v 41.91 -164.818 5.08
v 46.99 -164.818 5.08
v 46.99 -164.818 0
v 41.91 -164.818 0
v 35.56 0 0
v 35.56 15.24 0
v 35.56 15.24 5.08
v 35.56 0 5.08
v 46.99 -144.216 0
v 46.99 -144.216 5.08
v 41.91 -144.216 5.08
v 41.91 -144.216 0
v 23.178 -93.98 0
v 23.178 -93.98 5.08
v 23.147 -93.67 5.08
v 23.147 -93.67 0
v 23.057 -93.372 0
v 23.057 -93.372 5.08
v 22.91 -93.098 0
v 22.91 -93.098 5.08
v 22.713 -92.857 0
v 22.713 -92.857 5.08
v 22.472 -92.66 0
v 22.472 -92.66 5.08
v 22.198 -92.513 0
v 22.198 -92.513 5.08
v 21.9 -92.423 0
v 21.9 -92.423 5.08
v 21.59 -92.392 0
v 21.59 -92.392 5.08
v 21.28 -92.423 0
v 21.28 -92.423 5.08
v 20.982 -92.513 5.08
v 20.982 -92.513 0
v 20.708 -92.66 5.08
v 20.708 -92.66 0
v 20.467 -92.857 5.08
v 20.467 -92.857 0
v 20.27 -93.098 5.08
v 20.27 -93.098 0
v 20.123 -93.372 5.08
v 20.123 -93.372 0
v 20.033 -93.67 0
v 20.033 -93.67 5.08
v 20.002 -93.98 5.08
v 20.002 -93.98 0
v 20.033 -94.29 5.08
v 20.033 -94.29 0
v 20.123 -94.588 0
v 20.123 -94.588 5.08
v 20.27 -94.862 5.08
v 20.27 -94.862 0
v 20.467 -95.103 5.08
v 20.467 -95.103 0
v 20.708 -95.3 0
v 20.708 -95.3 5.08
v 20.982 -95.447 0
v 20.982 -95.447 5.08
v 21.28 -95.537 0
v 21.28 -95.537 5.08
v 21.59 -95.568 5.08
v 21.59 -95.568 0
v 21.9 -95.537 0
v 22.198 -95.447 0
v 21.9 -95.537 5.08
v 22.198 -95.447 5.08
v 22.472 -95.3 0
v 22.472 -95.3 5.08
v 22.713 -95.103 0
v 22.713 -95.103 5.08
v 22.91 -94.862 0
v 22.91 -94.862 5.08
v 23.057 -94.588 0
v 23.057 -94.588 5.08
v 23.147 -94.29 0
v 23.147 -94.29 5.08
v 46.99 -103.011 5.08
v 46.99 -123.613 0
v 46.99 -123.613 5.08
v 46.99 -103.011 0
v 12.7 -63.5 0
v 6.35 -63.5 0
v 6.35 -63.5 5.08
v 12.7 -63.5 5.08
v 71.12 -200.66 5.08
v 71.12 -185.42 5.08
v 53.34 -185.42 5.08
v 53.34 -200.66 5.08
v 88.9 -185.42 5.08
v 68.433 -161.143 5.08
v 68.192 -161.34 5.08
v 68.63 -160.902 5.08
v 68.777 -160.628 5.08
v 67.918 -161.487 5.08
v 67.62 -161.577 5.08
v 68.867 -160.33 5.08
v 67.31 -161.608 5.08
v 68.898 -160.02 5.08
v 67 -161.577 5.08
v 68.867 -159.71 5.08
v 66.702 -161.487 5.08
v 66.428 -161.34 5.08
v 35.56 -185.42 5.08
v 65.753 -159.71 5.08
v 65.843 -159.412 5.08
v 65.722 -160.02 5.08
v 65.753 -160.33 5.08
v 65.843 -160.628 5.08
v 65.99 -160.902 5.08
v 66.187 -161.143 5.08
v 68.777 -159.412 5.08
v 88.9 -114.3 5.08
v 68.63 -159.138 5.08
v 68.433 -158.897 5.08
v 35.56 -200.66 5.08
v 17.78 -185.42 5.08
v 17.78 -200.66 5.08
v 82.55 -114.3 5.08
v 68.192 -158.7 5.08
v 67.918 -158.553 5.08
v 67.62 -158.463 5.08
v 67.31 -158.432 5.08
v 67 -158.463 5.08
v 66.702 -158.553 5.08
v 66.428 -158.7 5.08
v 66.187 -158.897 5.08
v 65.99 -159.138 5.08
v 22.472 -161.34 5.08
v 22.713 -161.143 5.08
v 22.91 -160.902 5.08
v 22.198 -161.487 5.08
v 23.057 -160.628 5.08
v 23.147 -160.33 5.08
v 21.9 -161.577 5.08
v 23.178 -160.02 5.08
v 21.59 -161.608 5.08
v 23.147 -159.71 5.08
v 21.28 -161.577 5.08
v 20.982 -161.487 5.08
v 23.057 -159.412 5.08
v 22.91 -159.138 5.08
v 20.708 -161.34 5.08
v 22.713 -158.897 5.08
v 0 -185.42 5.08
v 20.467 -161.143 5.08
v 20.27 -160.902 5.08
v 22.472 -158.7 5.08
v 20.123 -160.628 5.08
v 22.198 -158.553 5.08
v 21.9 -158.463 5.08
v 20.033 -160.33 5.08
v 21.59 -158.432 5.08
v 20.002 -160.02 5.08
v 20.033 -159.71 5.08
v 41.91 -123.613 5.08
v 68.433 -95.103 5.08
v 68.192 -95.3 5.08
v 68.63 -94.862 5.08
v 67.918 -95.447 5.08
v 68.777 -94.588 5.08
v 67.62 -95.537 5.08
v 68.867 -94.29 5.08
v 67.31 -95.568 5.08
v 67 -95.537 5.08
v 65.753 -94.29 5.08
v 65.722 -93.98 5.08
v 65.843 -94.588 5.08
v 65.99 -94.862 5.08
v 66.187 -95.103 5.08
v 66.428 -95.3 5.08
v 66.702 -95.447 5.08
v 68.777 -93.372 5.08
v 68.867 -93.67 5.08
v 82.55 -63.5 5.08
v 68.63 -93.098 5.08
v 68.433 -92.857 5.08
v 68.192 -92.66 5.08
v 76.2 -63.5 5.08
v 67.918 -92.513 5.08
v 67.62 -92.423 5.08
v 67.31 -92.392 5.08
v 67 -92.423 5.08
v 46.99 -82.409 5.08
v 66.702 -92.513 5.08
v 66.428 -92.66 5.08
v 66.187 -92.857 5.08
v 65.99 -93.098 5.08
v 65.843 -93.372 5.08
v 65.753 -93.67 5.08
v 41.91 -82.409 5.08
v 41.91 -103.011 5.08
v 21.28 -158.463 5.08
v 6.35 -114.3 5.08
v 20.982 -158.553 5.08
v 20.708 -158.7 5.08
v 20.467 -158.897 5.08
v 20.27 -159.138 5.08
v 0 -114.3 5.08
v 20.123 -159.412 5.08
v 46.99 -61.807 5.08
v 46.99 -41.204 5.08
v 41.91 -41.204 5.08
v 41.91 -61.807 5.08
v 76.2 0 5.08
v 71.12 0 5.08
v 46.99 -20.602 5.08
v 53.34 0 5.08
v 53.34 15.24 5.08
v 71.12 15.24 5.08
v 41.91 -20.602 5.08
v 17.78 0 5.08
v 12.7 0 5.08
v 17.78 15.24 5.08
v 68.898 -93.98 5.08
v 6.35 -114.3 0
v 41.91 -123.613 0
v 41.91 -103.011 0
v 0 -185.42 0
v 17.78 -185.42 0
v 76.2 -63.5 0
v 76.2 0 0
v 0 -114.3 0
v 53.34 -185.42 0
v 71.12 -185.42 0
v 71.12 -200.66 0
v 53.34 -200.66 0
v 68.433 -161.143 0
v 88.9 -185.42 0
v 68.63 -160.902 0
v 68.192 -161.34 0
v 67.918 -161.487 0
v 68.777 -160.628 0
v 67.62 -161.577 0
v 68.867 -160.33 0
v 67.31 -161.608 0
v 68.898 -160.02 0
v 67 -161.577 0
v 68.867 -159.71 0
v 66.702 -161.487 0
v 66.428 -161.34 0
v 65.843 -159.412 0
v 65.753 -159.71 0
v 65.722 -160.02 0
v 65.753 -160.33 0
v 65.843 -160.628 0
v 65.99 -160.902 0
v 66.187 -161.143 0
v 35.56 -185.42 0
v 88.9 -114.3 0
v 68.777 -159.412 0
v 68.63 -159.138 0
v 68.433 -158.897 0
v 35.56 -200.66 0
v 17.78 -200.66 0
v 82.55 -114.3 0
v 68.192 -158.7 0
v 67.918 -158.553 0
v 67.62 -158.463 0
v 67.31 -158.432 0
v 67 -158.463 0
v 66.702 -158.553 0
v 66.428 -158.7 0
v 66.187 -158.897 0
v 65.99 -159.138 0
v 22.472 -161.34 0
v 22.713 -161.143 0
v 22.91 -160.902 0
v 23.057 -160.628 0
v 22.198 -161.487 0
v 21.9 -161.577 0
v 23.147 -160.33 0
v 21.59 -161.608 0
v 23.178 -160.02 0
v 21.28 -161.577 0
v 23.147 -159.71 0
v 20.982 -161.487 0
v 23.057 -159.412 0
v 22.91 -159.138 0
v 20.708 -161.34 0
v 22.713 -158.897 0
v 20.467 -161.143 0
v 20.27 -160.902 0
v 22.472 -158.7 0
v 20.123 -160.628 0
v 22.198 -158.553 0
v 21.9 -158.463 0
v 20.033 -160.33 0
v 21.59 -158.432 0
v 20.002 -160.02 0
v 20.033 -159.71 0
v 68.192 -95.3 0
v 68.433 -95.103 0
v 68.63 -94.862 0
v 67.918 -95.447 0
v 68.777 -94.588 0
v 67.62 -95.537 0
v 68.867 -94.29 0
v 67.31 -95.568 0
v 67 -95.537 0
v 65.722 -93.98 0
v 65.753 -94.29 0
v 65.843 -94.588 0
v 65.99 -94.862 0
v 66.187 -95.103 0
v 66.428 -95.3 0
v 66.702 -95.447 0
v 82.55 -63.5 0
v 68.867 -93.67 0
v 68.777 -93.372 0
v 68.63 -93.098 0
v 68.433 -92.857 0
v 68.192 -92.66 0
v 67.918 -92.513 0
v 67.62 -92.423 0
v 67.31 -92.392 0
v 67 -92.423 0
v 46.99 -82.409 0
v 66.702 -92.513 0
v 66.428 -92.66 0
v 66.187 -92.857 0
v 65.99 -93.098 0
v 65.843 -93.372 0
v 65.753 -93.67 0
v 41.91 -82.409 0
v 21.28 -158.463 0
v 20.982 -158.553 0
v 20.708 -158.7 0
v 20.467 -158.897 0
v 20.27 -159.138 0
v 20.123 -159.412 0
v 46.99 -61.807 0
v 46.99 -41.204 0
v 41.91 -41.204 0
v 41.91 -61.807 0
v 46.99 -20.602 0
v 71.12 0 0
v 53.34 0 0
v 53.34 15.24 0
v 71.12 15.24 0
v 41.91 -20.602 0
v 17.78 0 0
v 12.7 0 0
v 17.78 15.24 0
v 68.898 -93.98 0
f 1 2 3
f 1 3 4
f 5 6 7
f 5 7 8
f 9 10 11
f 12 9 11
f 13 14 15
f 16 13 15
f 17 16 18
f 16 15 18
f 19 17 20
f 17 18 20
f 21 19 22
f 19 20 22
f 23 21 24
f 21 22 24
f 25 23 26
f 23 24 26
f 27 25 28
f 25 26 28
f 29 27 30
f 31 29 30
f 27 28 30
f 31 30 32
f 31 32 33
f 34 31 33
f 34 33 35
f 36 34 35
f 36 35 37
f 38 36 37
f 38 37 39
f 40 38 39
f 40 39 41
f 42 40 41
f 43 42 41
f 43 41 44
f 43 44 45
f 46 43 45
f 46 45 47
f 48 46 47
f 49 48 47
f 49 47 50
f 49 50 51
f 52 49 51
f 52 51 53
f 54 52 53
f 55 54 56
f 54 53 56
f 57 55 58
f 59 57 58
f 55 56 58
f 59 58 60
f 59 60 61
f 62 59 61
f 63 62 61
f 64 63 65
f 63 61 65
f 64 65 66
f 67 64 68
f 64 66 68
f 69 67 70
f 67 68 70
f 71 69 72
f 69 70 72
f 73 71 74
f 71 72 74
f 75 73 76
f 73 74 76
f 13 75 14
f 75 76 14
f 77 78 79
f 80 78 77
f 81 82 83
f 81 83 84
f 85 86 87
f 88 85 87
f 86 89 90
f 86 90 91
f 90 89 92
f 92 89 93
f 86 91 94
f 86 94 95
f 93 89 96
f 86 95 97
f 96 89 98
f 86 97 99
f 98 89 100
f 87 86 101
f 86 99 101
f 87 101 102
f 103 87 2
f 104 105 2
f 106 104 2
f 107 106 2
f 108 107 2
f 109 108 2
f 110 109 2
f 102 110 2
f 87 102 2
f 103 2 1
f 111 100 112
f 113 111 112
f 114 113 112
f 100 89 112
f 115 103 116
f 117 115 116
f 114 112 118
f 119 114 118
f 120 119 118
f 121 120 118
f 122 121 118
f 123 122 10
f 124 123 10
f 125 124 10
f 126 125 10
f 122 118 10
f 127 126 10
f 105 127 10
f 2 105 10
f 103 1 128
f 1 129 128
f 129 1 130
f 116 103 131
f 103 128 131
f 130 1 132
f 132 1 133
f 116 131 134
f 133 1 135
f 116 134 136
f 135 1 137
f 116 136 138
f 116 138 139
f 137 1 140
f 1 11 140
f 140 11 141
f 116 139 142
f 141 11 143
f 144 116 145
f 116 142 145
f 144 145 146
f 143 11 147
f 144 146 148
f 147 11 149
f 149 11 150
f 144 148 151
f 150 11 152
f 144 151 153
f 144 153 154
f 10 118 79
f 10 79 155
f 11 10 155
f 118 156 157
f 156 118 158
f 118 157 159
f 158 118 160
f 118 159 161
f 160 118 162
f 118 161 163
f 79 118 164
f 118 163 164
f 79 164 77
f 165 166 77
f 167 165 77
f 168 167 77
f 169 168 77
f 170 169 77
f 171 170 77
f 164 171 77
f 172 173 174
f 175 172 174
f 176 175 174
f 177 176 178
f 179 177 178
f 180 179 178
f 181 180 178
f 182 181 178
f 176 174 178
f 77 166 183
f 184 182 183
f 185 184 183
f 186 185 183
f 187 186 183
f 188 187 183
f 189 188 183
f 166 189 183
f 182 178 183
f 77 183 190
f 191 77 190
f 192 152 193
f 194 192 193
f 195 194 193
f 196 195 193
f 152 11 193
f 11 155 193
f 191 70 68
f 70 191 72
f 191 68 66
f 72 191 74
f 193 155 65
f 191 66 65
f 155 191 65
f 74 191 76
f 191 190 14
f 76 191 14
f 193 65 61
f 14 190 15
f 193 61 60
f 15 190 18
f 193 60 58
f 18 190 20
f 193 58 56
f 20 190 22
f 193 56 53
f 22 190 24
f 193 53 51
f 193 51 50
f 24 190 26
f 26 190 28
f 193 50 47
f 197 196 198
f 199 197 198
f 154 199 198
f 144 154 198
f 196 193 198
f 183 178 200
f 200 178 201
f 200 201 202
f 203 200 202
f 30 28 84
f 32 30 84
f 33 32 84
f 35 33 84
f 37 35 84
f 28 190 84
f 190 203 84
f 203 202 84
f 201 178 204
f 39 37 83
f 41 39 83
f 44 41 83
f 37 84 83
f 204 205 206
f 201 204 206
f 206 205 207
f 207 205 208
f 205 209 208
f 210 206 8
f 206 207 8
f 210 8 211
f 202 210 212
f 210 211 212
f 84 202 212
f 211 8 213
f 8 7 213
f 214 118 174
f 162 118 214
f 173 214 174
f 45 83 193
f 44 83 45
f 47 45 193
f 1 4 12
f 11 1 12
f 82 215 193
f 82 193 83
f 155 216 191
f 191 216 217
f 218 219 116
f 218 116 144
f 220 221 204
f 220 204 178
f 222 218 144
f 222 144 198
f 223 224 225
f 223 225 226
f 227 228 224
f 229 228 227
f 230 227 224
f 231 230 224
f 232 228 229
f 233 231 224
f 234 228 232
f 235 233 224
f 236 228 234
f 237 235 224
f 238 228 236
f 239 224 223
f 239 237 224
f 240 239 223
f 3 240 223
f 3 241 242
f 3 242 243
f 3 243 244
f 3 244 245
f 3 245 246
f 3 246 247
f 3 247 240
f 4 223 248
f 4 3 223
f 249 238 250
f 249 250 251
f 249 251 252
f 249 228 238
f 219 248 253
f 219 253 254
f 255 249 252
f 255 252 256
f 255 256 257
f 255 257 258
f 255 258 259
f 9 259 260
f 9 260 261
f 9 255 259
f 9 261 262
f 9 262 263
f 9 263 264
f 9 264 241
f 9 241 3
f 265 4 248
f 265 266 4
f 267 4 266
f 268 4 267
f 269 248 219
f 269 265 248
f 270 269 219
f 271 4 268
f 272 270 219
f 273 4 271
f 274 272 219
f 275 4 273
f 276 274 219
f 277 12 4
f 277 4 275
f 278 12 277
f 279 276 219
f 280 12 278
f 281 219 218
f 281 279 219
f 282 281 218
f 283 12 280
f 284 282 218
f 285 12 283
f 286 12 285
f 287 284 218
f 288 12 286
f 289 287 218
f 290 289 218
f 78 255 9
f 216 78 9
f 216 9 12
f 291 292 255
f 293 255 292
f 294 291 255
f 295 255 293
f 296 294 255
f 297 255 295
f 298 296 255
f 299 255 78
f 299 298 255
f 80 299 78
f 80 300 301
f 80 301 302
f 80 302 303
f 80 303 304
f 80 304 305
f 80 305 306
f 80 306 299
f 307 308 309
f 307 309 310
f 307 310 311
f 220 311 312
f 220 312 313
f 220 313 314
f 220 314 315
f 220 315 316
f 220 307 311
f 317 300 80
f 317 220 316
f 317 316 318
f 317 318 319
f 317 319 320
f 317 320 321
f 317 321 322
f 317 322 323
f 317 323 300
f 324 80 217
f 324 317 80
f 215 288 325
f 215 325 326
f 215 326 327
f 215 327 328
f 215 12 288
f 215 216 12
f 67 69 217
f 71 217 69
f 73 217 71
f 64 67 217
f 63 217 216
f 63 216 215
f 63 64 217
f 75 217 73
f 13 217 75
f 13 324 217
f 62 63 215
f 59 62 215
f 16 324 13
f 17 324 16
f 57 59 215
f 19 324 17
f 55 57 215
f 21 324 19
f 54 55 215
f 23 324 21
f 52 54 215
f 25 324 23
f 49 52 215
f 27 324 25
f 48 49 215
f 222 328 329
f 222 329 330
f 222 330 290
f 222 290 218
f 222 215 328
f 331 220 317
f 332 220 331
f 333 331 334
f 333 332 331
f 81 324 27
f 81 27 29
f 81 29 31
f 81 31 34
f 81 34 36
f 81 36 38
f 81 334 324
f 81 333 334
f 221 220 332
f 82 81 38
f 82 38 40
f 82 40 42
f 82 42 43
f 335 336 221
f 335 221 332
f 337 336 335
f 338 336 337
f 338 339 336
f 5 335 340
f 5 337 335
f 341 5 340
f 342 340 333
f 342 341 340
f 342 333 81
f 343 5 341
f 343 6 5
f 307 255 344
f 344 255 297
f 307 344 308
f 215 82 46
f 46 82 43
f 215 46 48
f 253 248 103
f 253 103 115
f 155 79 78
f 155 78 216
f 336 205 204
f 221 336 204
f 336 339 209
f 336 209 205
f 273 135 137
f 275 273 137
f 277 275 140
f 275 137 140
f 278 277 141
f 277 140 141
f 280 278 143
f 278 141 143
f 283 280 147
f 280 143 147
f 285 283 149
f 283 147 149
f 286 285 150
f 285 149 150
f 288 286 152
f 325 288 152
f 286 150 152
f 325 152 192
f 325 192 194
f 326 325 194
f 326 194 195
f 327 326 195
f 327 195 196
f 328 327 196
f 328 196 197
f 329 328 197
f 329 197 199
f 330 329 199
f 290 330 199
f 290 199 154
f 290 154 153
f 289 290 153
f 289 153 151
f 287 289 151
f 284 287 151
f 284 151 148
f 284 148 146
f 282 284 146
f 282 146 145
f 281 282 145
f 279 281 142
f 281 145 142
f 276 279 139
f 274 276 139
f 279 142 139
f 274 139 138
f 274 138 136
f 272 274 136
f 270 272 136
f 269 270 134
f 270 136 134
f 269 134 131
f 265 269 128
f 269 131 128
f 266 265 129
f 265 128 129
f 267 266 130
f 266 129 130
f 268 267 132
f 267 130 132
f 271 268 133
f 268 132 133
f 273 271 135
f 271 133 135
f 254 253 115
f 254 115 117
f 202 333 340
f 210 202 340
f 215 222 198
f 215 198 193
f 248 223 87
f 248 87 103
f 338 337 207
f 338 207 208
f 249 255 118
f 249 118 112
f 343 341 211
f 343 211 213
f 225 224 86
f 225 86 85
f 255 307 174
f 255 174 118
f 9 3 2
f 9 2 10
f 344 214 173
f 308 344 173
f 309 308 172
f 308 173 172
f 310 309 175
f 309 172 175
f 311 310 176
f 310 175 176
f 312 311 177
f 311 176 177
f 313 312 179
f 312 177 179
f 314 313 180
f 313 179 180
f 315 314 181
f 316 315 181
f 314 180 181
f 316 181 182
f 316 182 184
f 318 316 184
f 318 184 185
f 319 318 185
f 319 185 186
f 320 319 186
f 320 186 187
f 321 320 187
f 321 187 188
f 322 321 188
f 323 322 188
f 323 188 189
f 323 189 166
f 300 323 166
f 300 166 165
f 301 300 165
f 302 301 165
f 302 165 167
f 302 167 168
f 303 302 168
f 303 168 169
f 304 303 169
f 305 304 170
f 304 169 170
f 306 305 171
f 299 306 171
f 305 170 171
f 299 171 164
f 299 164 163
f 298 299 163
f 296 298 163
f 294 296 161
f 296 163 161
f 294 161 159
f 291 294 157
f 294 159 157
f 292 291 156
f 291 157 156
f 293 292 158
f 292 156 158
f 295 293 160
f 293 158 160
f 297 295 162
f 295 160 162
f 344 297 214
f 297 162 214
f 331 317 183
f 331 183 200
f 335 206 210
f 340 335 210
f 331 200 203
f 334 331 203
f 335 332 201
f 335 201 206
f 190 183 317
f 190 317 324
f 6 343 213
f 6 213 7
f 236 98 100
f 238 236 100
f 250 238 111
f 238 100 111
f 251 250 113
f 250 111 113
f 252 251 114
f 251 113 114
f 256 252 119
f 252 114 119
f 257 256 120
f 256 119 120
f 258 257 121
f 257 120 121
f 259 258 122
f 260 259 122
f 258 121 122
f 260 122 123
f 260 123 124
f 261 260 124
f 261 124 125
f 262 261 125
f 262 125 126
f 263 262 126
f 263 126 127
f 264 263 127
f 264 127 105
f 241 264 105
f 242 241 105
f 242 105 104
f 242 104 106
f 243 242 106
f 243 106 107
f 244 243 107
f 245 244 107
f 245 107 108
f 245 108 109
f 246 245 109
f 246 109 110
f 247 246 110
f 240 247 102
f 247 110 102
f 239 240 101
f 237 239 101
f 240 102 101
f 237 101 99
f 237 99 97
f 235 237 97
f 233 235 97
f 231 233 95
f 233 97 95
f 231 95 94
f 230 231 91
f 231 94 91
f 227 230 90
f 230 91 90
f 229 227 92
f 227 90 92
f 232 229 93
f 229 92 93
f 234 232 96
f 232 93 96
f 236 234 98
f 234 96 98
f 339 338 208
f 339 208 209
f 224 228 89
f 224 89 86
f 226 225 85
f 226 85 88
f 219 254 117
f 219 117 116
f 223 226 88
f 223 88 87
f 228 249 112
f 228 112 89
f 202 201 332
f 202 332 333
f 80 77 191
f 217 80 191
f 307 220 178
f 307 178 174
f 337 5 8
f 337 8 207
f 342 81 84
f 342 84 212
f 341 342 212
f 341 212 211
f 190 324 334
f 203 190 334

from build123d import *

# Parameters (mm, degrees)
BOSS_EXTRUDE1_DEPTH = 5.08
SKETCH2_R           = 1.5875
CUT_EXTRUDE1_DEPTH  = 220.530070833
SKETCH3_W           = 5.08
SKETCH3_H           = 20.602222222
CUT_EXTRUDE2_DEPTH  = 220.530070833
CUT_EXTRUDE3_DEPTH  = 220.530070833


with BuildPart() as part:
    # Sketch1 → Boss-Extrude1 (new body)
    with BuildSketch(Plane.XY):
        Polygon((0, 0), (17.78, 0), (17.78, 15.24), (35.56, 15.24), (35.56, 0), (53.34, 0), (53.34, 15.24), (71.12, 15.24), (71.12, 0), (88.9, 0), (88.9, -185.42), (71.12, -185.42), (71.12, -200.66), (53.34, -200.66), (53.34, -185.42), (35.56, -185.42), (35.56, -200.66), (17.78, -200.66), (17.78, -185.42), (0, -185.42), align=None)
    extrude(amount=BOSS_EXTRUDE1_DEPTH)

    # Sketch2 → Cut-Extrude1 (cut, through all)
    with BuildSketch(Plane.XY.offset(5.08)):
        with Locations((21.59, -93.98)):
            Circle(SKETCH2_R)
        with Locations((67.31, -93.98)):
            Circle(SKETCH2_R)
        with Locations((67.31, -160.02)):
            Circle(SKETCH2_R)
        with Locations((21.59, -160.02)):
            Circle(SKETCH2_R)
    extrude(amount=-CUT_EXTRUDE1_DEPTH, mode=Mode.SUBTRACT)

    # Sketch3 → Cut-Extrude2 (cut, through all)
    with BuildSketch(Plane(origin=(0, 0, 0), x_dir=(-1, 0, 0), z_dir=(0, 0, -1))):
        with Locations((-44.45, -154.516666667)):
            Rectangle(SKETCH3_W, SKETCH3_H)
        with Locations((-44.45, -72.107777778)):
            Rectangle(SKETCH3_W, SKETCH3_H)
        with Locations((-44.45, -30.903333333)):
            Rectangle(SKETCH3_W, SKETCH3_H)
        with Locations((-44.45, -113.312222222)):
            Rectangle(SKETCH3_W, SKETCH3_H)
    extrude(amount=-CUT_EXTRUDE2_DEPTH, mode=Mode.SUBTRACT)

    # Sketch4 → Cut-Extrude3 (cut, through all)
    with BuildSketch(Plane(origin=(0, 0, 0), x_dir=(-1, 0, 0), z_dir=(0, 0, -1))):
        Polygon((-88.9, 0), (-76.2, 0), (-76.2, -63.5), (-82.55, -63.5), (-82.55, -114.3), (-88.9, -114.3), (-88.9, -63.5), align=None)
        Polygon((-6.35, -63.5), (-12.7, -63.5), (-12.7, 0), (0, 0), (0, -63.5), (0, -114.3), (-6.35, -114.3), align=None)
    extrude(amount=-CUT_EXTRUDE3_DEPTH, mode=Mode.SUBTRACT)


solid = part.part
